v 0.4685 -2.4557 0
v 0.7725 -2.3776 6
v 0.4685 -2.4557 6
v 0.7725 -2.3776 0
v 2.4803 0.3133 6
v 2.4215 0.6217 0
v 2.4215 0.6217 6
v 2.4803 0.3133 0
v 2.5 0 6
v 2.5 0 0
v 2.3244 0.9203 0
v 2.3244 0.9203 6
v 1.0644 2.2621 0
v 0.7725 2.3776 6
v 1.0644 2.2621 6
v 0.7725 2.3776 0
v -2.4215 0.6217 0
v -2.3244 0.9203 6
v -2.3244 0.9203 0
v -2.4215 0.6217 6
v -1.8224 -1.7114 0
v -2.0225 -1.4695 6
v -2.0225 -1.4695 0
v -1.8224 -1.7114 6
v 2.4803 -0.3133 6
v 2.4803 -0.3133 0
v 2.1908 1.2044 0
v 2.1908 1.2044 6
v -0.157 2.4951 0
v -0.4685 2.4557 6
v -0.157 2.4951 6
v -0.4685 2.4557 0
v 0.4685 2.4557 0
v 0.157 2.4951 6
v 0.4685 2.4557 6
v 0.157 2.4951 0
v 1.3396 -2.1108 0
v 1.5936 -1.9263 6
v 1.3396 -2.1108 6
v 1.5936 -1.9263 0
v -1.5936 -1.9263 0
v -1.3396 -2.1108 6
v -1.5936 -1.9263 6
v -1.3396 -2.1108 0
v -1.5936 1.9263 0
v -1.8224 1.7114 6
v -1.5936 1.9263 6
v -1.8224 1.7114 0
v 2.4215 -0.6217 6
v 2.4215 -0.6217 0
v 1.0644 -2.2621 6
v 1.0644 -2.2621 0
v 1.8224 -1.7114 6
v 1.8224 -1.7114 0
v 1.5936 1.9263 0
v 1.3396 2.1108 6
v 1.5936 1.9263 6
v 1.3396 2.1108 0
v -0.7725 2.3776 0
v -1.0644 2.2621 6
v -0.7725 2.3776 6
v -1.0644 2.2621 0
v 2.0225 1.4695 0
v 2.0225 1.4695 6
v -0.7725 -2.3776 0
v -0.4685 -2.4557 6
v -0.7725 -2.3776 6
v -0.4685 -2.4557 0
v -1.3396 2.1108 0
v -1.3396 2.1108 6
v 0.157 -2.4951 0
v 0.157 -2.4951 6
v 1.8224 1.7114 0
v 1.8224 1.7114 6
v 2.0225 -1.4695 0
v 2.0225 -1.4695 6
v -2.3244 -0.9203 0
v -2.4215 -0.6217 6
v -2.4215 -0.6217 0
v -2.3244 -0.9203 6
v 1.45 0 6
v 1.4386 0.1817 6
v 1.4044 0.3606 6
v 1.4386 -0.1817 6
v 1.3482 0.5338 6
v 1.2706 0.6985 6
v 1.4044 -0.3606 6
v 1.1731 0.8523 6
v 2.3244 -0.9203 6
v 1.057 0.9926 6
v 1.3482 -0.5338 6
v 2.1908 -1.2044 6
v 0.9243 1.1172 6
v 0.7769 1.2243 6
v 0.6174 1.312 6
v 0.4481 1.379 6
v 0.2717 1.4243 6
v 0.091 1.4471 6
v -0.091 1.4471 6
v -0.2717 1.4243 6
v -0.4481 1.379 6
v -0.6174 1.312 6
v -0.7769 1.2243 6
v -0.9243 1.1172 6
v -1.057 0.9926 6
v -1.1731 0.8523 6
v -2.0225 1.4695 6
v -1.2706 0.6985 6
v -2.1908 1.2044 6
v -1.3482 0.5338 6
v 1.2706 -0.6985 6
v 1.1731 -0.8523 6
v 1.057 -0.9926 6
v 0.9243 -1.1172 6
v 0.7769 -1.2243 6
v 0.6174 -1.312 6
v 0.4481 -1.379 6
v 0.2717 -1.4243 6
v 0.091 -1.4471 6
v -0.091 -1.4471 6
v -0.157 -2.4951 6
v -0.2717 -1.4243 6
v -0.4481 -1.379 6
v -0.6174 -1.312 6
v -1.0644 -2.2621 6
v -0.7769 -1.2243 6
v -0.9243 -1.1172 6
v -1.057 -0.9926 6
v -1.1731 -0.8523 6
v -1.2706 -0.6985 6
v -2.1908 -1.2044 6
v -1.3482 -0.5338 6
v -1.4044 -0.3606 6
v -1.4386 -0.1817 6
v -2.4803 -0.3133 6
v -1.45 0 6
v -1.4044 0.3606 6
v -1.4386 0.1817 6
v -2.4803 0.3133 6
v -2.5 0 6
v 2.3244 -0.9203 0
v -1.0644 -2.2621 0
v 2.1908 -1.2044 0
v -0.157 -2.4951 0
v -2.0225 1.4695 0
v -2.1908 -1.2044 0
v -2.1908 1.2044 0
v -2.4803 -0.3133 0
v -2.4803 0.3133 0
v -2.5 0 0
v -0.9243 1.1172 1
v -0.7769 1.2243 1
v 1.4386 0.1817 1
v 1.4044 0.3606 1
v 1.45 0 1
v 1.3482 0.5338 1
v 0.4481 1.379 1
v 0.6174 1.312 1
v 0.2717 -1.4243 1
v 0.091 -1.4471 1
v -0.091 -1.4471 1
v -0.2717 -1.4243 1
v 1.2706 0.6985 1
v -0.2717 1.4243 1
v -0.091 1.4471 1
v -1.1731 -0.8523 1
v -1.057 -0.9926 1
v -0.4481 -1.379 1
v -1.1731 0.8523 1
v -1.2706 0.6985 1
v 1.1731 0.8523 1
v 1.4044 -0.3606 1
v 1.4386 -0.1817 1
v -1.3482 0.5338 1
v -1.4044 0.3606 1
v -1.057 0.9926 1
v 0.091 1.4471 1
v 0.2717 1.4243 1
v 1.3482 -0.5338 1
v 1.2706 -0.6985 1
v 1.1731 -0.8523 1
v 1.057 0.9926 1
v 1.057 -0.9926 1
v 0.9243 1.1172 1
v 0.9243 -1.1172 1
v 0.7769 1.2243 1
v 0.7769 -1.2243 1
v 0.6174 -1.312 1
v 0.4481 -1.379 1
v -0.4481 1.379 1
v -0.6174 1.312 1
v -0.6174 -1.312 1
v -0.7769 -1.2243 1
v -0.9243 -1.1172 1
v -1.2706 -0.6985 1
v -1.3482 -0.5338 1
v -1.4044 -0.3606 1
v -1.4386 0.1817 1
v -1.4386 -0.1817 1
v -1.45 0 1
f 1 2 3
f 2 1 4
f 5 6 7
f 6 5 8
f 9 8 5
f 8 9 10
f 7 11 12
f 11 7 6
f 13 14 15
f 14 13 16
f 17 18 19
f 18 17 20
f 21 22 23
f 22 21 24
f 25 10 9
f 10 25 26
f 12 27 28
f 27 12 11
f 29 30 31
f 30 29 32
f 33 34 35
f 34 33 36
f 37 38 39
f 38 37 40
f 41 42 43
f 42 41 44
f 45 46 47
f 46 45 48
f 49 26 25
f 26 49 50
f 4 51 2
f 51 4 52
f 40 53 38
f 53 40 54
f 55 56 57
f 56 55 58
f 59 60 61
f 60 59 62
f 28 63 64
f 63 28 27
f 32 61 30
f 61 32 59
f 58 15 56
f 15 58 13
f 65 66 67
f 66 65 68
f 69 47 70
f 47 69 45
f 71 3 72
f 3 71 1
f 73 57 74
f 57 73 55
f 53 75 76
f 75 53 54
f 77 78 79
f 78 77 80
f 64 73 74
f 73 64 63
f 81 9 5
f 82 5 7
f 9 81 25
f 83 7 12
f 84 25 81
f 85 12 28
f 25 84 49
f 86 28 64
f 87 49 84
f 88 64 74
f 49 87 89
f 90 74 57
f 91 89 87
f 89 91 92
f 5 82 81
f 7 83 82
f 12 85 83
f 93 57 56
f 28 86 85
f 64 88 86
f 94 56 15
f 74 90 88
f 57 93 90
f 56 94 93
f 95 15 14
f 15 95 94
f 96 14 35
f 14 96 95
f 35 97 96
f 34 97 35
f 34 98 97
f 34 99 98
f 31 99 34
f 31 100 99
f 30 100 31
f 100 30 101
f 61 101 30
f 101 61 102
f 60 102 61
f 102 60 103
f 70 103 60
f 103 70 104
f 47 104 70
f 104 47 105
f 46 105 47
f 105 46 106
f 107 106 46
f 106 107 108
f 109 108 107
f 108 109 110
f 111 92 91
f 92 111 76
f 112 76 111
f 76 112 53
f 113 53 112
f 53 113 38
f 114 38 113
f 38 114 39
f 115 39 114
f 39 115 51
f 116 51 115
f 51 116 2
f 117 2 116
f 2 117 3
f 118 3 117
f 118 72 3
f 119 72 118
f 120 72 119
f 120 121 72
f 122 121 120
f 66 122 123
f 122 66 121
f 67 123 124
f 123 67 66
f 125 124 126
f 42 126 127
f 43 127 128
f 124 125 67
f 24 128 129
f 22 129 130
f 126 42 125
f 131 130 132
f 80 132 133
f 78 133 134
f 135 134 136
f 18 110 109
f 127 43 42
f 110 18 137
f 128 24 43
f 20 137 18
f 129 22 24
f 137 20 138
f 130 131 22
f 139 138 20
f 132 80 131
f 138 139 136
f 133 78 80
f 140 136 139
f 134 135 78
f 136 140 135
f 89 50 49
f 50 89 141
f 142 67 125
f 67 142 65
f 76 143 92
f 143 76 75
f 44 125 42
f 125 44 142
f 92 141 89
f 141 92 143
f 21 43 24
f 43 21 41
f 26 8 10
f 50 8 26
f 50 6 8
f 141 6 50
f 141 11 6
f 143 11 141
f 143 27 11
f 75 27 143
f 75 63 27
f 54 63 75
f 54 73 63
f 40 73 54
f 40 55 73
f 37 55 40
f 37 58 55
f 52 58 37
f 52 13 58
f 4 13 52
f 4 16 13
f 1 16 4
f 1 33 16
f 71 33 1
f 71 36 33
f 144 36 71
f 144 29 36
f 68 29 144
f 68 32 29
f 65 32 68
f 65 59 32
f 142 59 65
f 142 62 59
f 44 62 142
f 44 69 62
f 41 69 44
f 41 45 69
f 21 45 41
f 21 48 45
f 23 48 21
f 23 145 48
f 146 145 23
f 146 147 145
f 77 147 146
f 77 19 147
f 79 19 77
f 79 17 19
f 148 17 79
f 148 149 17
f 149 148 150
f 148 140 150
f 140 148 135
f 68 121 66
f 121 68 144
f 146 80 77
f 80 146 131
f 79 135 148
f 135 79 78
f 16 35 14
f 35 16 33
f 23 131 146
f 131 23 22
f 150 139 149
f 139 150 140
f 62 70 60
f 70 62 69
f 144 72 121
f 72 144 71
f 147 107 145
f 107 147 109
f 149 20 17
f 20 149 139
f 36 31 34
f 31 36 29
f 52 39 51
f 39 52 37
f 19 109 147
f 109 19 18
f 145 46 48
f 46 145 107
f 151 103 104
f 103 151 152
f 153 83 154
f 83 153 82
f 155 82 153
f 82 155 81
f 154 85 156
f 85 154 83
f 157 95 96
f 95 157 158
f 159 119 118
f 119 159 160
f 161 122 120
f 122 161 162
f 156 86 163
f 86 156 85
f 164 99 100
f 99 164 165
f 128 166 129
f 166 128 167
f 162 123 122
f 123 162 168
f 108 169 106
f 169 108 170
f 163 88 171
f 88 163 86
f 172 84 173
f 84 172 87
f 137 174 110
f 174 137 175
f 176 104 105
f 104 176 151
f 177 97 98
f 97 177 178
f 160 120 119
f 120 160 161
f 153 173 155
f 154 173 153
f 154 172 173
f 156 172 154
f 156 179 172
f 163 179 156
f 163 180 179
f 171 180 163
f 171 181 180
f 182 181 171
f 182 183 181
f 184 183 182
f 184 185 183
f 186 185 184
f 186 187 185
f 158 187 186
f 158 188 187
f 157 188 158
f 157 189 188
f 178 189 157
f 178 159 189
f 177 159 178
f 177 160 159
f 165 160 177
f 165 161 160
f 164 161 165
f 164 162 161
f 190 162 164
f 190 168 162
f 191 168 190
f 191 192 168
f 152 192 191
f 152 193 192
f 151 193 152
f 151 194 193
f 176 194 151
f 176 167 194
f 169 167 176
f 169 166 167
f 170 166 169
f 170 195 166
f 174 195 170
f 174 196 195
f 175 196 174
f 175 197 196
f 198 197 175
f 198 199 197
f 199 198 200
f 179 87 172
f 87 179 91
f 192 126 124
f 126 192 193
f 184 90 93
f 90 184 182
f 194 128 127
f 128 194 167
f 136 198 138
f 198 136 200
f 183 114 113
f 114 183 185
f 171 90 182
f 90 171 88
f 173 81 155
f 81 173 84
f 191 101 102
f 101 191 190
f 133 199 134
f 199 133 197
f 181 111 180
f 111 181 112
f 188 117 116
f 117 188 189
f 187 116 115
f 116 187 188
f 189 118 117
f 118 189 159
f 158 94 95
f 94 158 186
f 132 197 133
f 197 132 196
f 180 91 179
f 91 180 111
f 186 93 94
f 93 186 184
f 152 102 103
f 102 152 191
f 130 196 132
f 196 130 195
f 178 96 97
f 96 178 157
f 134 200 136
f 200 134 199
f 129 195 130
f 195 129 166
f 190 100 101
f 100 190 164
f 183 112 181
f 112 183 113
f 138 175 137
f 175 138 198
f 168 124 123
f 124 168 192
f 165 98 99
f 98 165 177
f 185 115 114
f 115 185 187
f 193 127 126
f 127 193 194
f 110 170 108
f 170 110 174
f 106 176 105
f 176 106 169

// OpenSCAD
difference () {
    cylinder(d=5, h=6, $fn=50);

    translate([0,0,1])
        cylinder(d=2.9, h=6, $fn=50);
}
